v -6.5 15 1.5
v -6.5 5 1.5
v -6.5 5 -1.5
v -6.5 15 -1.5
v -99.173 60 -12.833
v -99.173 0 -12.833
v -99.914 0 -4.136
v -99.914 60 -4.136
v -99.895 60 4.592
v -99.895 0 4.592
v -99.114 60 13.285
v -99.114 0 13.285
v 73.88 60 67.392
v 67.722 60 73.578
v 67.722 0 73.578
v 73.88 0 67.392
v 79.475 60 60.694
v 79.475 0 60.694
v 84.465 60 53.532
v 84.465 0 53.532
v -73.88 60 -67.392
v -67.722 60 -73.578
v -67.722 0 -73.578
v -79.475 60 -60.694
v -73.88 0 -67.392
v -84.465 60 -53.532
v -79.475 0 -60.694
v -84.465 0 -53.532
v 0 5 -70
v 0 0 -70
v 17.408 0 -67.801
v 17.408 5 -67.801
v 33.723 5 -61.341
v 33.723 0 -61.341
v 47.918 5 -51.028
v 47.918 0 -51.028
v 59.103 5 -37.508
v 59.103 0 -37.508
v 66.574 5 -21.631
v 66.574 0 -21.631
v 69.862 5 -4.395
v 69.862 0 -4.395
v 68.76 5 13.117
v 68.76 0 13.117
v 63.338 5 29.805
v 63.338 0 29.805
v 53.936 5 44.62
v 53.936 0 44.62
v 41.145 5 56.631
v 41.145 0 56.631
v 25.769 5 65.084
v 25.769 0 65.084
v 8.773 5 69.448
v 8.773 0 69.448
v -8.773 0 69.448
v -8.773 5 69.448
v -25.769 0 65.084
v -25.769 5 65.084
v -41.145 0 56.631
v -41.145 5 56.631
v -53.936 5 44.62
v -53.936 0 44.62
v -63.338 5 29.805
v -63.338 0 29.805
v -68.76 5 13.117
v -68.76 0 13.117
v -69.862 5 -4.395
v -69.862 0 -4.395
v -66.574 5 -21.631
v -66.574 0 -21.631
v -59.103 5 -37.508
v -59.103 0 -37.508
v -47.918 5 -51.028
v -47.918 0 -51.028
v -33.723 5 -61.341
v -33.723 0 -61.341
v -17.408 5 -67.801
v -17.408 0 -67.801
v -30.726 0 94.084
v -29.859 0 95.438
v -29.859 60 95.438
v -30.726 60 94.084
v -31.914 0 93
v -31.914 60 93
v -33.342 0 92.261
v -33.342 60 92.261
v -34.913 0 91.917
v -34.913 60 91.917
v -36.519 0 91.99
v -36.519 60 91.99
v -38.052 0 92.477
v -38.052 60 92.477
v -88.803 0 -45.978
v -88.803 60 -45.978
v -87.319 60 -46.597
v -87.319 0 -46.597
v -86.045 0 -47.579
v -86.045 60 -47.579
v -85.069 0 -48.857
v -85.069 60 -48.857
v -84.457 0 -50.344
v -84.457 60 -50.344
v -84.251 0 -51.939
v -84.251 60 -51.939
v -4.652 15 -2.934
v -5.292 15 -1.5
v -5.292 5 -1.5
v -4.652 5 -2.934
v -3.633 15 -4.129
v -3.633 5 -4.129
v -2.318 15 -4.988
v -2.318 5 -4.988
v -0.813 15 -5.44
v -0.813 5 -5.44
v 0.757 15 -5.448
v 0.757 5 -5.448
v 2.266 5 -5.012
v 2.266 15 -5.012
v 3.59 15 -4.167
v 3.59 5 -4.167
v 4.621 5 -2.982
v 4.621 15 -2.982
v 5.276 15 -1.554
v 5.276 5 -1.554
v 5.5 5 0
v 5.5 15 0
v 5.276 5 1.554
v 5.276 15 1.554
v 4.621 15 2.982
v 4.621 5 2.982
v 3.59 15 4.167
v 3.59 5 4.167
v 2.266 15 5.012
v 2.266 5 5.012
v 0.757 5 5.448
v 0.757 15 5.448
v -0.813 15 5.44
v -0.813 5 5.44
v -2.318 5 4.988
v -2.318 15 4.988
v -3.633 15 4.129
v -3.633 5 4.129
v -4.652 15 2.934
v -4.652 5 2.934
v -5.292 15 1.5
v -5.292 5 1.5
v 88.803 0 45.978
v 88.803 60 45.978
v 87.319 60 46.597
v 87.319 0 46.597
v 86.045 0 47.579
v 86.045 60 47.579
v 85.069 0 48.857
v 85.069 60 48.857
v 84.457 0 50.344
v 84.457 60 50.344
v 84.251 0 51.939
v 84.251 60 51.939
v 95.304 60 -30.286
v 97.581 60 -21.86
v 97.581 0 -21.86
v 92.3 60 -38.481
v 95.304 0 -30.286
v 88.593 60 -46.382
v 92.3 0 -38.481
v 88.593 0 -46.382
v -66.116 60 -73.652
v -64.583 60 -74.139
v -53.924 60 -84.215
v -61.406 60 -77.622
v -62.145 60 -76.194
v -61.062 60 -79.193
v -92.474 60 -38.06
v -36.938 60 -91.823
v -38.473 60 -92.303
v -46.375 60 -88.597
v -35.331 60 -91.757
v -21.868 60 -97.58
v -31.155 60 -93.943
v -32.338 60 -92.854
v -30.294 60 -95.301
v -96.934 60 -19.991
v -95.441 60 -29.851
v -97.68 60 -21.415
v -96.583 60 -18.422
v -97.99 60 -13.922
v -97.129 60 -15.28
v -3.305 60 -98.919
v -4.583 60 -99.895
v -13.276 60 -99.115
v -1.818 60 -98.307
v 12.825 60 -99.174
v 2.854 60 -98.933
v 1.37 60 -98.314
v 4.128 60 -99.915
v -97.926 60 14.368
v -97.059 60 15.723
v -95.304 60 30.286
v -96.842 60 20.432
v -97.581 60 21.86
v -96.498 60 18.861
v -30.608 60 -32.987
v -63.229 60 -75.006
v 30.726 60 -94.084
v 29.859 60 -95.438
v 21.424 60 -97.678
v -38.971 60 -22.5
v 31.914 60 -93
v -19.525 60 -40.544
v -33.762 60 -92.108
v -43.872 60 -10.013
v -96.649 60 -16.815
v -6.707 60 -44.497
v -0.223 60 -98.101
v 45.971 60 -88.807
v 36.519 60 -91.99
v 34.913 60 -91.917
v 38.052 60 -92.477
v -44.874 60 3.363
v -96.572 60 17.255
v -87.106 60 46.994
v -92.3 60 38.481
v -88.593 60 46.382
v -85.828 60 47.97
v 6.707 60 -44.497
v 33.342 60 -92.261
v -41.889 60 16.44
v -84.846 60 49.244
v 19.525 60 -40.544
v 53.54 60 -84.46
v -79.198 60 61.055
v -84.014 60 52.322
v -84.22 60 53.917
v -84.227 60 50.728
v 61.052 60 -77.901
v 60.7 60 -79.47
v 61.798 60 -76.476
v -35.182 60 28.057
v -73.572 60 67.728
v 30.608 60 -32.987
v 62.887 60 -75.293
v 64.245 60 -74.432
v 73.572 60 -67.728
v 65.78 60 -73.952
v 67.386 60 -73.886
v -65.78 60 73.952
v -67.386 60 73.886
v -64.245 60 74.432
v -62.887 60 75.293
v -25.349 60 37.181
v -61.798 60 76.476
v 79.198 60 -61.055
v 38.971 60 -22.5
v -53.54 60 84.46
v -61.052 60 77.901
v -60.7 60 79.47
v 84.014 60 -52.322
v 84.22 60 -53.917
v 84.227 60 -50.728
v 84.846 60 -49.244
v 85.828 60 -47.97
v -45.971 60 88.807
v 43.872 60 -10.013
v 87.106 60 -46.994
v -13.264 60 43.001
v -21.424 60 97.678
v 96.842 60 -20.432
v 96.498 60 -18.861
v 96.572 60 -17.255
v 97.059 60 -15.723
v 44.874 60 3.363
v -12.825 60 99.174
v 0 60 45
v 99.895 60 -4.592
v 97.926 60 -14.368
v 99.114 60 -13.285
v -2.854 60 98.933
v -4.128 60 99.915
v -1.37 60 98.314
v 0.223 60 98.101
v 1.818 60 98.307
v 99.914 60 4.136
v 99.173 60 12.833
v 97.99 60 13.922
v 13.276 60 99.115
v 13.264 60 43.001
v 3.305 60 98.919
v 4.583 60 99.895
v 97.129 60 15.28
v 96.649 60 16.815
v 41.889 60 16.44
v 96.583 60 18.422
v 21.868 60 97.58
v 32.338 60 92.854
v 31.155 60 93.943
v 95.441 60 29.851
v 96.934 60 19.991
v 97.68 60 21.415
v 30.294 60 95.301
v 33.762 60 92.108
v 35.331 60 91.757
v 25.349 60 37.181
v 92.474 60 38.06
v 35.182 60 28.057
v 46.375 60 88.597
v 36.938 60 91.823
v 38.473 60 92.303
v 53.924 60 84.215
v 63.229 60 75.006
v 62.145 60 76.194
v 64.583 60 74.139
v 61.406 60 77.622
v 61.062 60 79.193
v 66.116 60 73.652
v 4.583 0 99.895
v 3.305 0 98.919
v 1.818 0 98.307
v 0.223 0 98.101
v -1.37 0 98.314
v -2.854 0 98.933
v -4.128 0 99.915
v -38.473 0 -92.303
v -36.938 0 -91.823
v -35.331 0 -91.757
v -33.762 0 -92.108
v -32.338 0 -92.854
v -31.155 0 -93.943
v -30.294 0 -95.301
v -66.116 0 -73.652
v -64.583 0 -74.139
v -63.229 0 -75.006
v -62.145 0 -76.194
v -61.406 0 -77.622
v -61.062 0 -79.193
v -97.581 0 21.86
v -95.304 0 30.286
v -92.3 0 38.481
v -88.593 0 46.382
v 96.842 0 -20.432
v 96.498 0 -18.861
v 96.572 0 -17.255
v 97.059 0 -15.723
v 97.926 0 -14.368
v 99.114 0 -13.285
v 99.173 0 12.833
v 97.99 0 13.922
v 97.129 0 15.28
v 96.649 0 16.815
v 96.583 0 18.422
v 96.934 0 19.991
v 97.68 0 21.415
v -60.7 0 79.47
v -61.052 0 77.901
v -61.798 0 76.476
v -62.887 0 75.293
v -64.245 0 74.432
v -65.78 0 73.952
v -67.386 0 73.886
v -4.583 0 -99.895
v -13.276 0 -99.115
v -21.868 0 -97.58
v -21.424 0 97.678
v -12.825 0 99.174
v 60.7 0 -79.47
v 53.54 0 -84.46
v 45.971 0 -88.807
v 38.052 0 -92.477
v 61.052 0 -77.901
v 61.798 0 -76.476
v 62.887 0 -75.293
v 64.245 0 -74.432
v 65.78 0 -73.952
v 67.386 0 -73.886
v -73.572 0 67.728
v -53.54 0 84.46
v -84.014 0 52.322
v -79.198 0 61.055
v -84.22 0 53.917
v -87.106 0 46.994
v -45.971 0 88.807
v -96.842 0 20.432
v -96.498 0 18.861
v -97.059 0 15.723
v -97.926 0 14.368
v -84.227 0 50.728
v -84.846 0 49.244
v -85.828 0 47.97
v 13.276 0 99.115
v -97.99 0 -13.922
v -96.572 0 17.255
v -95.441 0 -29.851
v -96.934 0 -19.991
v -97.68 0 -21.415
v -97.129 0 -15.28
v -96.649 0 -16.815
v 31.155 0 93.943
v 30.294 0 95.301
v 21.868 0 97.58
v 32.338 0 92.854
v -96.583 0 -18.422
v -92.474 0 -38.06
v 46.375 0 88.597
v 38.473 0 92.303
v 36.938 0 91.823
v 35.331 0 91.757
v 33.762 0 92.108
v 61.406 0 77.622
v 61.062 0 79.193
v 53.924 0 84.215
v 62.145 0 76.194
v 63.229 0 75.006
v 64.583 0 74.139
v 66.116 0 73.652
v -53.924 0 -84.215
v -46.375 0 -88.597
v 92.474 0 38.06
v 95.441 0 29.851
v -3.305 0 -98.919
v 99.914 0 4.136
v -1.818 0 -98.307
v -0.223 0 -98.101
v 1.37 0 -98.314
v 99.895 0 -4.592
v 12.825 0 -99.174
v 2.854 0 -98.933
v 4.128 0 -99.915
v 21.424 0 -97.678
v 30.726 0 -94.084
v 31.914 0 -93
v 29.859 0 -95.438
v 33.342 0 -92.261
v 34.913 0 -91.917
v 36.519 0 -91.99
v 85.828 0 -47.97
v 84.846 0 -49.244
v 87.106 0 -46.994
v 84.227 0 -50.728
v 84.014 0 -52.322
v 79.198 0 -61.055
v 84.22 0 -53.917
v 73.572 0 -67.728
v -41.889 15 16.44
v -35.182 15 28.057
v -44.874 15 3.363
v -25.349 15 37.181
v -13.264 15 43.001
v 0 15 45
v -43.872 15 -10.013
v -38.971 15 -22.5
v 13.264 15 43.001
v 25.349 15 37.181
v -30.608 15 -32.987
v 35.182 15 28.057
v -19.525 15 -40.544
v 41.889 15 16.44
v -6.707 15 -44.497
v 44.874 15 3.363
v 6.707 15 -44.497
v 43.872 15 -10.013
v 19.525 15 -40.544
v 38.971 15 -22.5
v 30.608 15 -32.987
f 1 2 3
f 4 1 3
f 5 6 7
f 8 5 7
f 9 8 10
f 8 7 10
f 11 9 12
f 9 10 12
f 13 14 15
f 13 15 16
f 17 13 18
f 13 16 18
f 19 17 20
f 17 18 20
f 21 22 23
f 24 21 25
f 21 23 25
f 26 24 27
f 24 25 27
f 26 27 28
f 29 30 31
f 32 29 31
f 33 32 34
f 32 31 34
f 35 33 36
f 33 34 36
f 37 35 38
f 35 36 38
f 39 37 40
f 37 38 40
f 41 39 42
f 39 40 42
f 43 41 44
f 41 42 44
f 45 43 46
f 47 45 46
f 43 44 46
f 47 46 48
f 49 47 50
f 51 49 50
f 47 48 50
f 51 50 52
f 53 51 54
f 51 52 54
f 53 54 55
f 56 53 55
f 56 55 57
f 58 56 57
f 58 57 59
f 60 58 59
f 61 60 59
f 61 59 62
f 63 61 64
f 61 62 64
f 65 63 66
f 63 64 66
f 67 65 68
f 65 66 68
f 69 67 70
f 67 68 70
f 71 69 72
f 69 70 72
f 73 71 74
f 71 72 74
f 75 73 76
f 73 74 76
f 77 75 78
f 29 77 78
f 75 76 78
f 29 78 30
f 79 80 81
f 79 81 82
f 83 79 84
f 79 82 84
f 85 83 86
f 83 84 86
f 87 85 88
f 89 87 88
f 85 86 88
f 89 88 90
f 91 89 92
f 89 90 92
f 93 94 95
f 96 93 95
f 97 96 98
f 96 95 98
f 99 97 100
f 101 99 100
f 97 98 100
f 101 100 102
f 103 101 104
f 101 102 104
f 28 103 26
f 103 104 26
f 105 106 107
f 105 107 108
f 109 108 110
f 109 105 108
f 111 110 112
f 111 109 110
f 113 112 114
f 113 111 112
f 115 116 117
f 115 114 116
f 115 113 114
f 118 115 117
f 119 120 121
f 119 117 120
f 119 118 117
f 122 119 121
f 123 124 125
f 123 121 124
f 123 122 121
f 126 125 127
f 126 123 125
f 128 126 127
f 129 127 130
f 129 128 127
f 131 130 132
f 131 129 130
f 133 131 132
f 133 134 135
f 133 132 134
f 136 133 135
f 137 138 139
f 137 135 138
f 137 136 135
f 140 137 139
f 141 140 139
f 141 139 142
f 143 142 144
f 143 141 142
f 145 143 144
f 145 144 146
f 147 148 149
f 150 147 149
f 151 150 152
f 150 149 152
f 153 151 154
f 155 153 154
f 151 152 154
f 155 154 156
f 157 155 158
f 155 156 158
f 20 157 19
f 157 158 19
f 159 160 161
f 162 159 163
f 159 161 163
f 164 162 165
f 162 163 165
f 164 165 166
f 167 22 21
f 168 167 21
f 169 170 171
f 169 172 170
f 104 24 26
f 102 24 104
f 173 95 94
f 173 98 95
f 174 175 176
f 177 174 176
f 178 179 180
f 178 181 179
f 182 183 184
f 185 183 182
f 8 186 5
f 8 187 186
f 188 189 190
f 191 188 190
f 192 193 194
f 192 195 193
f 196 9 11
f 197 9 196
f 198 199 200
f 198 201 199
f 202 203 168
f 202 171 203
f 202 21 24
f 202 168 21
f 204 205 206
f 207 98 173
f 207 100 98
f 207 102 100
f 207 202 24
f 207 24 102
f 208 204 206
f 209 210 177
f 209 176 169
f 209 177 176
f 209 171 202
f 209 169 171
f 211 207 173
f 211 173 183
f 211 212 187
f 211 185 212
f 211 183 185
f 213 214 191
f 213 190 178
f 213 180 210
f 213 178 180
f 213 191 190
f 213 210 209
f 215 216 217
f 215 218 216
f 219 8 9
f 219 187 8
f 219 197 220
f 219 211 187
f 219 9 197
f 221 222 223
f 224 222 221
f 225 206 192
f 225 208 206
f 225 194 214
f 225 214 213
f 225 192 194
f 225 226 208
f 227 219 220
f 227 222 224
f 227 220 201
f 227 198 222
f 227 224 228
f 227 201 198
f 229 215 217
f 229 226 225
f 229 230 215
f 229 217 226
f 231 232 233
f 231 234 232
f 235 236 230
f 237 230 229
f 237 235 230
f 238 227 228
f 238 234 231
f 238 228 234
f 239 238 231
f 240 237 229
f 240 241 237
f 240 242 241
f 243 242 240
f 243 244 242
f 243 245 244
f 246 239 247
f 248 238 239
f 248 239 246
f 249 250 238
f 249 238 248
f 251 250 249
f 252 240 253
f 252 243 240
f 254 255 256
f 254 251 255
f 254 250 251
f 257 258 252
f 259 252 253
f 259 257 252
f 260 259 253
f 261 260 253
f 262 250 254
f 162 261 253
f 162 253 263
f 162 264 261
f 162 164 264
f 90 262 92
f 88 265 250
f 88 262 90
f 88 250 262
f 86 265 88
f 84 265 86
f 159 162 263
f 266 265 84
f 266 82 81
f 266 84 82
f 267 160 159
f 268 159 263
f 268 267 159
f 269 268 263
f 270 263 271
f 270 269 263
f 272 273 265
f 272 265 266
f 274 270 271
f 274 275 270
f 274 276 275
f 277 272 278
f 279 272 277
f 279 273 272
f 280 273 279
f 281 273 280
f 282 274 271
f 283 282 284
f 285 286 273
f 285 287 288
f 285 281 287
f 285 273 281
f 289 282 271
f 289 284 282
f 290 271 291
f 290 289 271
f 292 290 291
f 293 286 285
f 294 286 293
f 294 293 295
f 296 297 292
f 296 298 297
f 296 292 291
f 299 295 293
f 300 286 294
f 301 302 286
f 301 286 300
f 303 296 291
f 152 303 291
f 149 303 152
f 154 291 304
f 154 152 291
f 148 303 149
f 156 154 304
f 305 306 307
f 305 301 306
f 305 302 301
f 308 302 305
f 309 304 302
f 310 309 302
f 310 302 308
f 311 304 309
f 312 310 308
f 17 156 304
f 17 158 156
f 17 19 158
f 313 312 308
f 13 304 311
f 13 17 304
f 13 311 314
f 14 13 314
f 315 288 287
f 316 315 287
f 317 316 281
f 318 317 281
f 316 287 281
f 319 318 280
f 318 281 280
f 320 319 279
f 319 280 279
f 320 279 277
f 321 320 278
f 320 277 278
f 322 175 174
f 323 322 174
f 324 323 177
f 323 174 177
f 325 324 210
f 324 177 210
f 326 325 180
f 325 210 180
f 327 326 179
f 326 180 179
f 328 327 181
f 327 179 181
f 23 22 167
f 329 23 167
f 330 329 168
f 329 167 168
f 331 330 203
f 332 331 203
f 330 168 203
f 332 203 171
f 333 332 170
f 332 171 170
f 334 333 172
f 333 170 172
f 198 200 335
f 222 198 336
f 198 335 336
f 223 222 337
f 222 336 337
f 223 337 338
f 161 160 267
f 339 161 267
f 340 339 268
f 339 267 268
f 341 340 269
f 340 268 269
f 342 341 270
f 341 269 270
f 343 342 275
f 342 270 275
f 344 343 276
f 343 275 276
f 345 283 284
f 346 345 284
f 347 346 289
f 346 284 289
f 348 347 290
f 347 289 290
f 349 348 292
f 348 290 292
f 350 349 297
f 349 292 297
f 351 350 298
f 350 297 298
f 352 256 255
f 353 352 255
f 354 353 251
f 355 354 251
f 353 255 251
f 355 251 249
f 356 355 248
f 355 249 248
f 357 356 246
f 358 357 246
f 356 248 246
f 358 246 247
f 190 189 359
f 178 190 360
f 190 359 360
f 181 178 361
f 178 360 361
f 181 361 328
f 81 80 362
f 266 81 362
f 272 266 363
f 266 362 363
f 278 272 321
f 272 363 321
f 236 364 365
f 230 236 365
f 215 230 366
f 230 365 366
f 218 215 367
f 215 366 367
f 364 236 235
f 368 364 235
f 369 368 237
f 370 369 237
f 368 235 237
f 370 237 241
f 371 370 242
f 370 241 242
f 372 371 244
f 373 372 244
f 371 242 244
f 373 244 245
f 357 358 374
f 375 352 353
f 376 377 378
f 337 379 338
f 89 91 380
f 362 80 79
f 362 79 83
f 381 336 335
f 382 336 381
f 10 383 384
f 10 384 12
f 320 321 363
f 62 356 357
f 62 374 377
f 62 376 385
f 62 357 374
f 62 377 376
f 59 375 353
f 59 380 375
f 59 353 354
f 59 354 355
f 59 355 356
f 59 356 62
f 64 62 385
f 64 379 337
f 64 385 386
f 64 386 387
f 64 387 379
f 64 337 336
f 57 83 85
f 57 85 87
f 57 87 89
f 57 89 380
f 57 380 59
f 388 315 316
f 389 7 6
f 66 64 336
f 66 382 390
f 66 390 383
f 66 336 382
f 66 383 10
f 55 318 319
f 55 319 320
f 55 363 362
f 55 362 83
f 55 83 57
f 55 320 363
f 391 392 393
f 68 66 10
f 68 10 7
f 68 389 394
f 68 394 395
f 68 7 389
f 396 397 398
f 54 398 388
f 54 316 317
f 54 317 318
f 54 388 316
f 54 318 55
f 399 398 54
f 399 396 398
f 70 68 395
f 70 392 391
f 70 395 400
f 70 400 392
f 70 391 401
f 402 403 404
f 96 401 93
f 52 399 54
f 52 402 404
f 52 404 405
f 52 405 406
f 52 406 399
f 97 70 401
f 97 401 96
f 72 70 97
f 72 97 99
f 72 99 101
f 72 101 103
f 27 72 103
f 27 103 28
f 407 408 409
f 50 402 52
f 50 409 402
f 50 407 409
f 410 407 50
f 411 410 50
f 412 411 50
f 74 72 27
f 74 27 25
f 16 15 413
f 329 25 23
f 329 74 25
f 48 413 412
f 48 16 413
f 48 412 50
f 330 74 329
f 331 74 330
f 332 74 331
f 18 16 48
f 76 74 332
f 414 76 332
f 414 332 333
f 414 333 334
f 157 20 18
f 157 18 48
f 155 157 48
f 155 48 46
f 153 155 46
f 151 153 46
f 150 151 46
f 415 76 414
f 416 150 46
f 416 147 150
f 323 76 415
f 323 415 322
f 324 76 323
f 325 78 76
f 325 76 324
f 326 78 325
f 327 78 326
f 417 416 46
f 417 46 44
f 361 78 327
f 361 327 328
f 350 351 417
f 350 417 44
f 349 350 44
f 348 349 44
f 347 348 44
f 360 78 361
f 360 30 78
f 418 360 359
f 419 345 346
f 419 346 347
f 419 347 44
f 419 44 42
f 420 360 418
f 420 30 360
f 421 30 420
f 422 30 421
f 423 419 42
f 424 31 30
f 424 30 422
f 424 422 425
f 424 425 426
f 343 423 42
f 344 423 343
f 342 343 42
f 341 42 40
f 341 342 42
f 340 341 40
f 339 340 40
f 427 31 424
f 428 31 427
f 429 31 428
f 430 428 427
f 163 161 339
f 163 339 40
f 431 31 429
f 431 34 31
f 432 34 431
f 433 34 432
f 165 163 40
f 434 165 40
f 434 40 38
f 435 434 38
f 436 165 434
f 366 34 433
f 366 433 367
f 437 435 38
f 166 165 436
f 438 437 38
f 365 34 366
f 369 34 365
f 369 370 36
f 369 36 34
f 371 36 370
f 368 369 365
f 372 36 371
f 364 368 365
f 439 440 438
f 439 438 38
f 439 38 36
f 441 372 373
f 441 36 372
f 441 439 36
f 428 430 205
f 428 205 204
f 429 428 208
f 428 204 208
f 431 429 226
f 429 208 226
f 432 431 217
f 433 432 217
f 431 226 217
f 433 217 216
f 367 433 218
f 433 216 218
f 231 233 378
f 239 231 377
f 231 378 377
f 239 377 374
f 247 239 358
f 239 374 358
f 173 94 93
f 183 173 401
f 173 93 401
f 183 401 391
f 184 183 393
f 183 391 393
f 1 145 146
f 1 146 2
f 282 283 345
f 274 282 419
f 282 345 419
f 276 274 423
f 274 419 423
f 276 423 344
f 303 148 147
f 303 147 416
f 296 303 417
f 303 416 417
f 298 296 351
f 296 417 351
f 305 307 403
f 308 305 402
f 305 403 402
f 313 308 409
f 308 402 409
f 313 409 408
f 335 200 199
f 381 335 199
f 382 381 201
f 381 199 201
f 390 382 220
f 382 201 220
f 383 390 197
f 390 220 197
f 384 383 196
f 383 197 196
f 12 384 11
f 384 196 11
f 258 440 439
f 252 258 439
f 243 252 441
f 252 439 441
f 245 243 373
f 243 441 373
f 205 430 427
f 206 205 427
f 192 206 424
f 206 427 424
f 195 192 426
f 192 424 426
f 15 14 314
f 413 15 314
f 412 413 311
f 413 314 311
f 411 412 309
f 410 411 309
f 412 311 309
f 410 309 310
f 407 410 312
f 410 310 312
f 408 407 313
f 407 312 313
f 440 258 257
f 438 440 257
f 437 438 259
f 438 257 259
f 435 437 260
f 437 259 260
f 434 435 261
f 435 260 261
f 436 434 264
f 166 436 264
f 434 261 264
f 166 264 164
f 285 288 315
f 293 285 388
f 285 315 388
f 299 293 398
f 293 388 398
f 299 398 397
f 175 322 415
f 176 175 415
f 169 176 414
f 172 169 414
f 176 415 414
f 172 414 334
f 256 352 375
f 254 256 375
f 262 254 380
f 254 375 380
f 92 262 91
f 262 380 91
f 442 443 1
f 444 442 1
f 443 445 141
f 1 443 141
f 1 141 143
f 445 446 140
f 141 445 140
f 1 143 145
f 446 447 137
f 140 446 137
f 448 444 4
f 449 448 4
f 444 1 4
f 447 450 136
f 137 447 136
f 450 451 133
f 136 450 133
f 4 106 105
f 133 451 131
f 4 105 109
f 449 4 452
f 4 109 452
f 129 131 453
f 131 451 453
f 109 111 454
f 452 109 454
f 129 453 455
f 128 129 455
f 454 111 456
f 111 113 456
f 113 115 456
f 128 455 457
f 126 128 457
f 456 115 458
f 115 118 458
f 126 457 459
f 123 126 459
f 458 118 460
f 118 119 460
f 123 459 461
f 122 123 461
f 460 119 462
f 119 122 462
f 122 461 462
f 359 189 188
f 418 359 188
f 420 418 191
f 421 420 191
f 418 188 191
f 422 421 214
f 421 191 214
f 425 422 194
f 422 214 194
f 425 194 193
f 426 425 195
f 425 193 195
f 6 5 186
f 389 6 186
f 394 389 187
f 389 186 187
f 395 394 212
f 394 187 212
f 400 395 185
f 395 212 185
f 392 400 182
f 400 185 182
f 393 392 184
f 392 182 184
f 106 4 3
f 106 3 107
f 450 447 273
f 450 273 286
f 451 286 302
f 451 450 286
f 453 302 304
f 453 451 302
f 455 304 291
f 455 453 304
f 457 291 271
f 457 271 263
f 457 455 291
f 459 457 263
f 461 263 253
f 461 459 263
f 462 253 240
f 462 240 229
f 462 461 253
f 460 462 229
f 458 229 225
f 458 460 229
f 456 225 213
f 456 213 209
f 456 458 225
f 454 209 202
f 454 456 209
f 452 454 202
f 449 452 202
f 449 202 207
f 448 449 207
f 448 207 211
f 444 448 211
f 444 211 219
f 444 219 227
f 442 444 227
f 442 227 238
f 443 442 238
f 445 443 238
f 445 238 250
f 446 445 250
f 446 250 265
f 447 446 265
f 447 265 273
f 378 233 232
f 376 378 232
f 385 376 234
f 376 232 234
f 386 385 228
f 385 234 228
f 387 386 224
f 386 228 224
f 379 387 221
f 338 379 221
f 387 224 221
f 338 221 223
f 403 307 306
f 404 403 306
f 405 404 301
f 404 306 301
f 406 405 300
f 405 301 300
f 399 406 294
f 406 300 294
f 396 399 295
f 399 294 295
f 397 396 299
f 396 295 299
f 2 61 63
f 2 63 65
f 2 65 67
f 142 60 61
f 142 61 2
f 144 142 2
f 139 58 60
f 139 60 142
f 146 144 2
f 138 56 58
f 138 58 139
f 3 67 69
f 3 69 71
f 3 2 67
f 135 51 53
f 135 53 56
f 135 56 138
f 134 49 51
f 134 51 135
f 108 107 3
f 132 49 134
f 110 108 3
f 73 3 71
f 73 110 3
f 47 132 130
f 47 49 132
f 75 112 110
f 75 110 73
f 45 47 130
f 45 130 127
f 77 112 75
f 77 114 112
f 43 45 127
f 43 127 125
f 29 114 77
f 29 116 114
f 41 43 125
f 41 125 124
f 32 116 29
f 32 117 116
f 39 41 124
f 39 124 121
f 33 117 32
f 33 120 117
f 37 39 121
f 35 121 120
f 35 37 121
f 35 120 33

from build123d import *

# Parameters (mm, degrees)
SKETCH1_R           = 100
SKETCH1_R_2         = 45
BOSS_EXTRUDE1_DEPTH = 60
SKETCH2_R           = 45
BOSS_EXTRUDE2_DEPTH = 15
CUT_EXTRUDE2_DEPTH  = 85
SKETCH5_R           = 70
CUT_EXTRUDE3_DEPTH  = 5
CUT_EXTRUDE4_DEPTH  = 50


with BuildPart() as part:
    # Sketch1 → Boss-Extrude1 (new body)
    with BuildSketch(Plane(origin=(0, 0, 0), x_dir=(1, 0, 0), z_dir=(0, 1, 0))):
        with Locations(Location((0, 0, 0), (0, 0, 270))):
            Circle(SKETCH1_R)
        with Locations(Location((0, 0, 0), (0, 0, 270))):
            Circle(SKETCH1_R_2, mode=Mode.SUBTRACT)
    extrude(amount=BOSS_EXTRUDE1_DEPTH)

    # Sketch2 → Boss-Extrude2 (add)
    with BuildSketch(Plane.XZ):
        with Locations(Location((0, 0, 0), (0, 0, 270))):
            Circle(SKETCH2_R)
    extrude(amount=-BOSS_EXTRUDE2_DEPTH)

    # Sketch4 → Cut-Extrude2 (cut)
    with BuildSketch(Plane(origin=(0, 60, 0), x_dir=(1, 0, 0), z_dir=(0, 1, 0))):
        with BuildLine():
            ThreePointArc((-4.583072667, 99.894922018), (-0.223462851, 98.100736099), (4.127927842, 99.914764733))
            ThreePointArc((4.127927842, 99.914764733), (-0.236423106, 103.790319504), (-4.583072667, 99.894922018))
        make_face()
        with BuildLine():
            ThreePointArc((29.85939598, 95.438024244), (33.342441429, 92.260966602), (38.051845487, 92.477332655))
            ThreePointArc((38.051845487, 92.477332655), (35.276214905, 97.611858812), (29.85939598, 95.438024244))
        make_face()
        with BuildLine():
            ThreePointArc((60.700380795, 79.469892232), (62.88675519, 75.293162907), (67.386148981, 73.885769439))
            ThreePointArc((67.386148981, 73.885769439), (66.534020776, 79.659967349), (60.700380795, 79.469892232))
        make_face()
        with BuildLine():
            ThreePointArc((84.220003843, 53.916518366), (84.845998166, 49.243892556), (88.592688393, 46.38249199))
            ThreePointArc((88.592688393, 46.38249199), (89.766841805, 52.099908168), (84.220003843, 53.916518366))
        make_face()
        with BuildLine():
            ThreePointArc((97.581451473, 21.860016662), (96.57156157, 17.255082), (99.113642097, 13.284801475))
            ThreePointArc((99.113642097, 13.284801475), (102.172456894, 18.255831149), (97.581451473, 21.860016662))
        make_face()
        with BuildLine():
            ThreePointArc((99.173135906, -12.833125672), (96.649169404, -16.814946103), (97.680027802, -21.415232161))
            ThreePointArc((97.680027802, -21.415232161), (102.254565777, -17.790168534), (99.173135906, -12.833125672))
        make_face()
        with BuildLine():
            ThreePointArc((88.80307651, -45.978403652), (85.069461017, -48.856843544), (84.464760551, -53.532272743))
            ThreePointArc((84.464760551, -53.532272743), (90.003264911, -51.690411336), (88.80307651, -45.978403652))
        make_face()
        with BuildLine():
            ThreePointArc((67.722055492, -73.578007583), (63.229120141, -75.005884603), (61.06179661, -79.19253118))
            ThreePointArc((61.06179661, -79.19253118), (66.896241989, -79.356027663), (67.722055492, -73.578007583))
        make_face()
        with BuildLine():
            ThreePointArc((38.472755112, -92.303017904), (33.762414213, -92.10810901), (30.293878822, -95.3010016))
            ThreePointArc((30.293878822, -95.3010016), (35.720545001, -97.450135883), (38.472755112, -92.303017904))
        make_face()
        with BuildLine():
            ThreePointArc((4.583072667, -99.894922018), (0.223462851, -98.100736099), (-4.127927842, -99.914764733))
            ThreePointArc((-4.127927842, -99.914764733), (0.236423106, -103.790319504), (4.583072667, -99.894922018))
        make_face()
        with BuildLine():
            ThreePointArc((-29.85939598, -95.438024244), (-33.342441429, -92.260966602), (-38.051845487, -92.477332655))
            ThreePointArc((-38.051845487, -92.477332655), (-35.276214905, -97.611858812), (-29.85939598, -95.438024244))
        make_face()
        with BuildLine():
            ThreePointArc((-60.700380795, -79.469892232), (-62.88675519, -75.293162907), (-67.386148981, -73.885769439))
            ThreePointArc((-67.386148981, -73.885769439), (-66.534020776, -79.659967349), (-60.700380795, -79.469892232))
        make_face()
        with BuildLine():
            ThreePointArc((-84.220003843, -53.916518366), (-84.845998166, -49.243892556), (-88.592688393, -46.38249199))
            ThreePointArc((-88.592688393, -46.38249199), (-89.766841805, -52.099908168), (-84.220003843, -53.916518366))
        make_face()
        with BuildLine():
            ThreePointArc((-97.581451473, -21.860016662), (-96.57156157, -17.255082), (-99.113642097, -13.284801475))
            ThreePointArc((-99.113642097, -13.284801475), (-102.172456894, -18.255831149), (-97.581451473, -21.860016662))
        make_face()
        with BuildLine():
            ThreePointArc((-99.173135906, 12.833125672), (-96.649169404, 16.814946103), (-97.680027802, 21.415232161))
            ThreePointArc((-97.680027802, 21.415232161), (-102.254565777, 17.790168534), (-99.173135906, 12.833125672))
        make_face()
        with BuildLine():
            ThreePointArc((-88.80307651, 45.978403652), (-85.069461017, 48.856843544), (-84.464760551, 53.532272743))
            ThreePointArc((-84.464760551, 53.532272743), (-90.003264911, 51.690411336), (-88.80307651, 45.978403652))
        make_face()
        with BuildLine():
            ThreePointArc((-67.722055492, 73.578007583), (-63.229120141, 75.005884603), (-61.06179661, 79.19253118))
            ThreePointArc((-61.06179661, 79.19253118), (-66.896241989, 79.356027663), (-67.722055492, 73.578007583))
        make_face()
        with BuildLine():
            ThreePointArc((-38.472755112, 92.303017904), (-33.762414213, 92.10810901), (-30.293878822, 95.3010016))
            ThreePointArc((-30.293878822, 95.3010016), (-35.720545001, 97.450135883), (-38.472755112, 92.303017904))
        make_face()
    extrude(amount=-CUT_EXTRUDE2_DEPTH, mode=Mode.SUBTRACT)

    # Sketch5 → Cut-Extrude3 (cut)
    with BuildSketch(Plane.XZ):
        with Locations(Location((0, 0, 0), (0, 0, 270))):
            Circle(SKETCH5_R)
    extrude(amount=-CUT_EXTRUDE3_DEPTH, mode=Mode.SUBTRACT)

    # Sketch3 → Cut-Extrude4 (cut)
    with BuildSketch(Plane(origin=(0, 15, 0), x_dir=(1, 0, 0), z_dir=(0, 1, 0))):
        with BuildLine():
            Line((-6.5, 1.5), (-5.291502622, 1.5))
            ThreePointArc((-5.291502622, 1.5), (5.5, 0), (-5.291502622, -1.5))
            Line((-5.291502622, -1.5), (-6.5, -1.5))
            Line((-6.5, -1.5), (-6.5, 1.5))
        make_face()
    extrude(amount=-CUT_EXTRUDE4_DEPTH, mode=Mode.SUBTRACT)


solid = part.part
